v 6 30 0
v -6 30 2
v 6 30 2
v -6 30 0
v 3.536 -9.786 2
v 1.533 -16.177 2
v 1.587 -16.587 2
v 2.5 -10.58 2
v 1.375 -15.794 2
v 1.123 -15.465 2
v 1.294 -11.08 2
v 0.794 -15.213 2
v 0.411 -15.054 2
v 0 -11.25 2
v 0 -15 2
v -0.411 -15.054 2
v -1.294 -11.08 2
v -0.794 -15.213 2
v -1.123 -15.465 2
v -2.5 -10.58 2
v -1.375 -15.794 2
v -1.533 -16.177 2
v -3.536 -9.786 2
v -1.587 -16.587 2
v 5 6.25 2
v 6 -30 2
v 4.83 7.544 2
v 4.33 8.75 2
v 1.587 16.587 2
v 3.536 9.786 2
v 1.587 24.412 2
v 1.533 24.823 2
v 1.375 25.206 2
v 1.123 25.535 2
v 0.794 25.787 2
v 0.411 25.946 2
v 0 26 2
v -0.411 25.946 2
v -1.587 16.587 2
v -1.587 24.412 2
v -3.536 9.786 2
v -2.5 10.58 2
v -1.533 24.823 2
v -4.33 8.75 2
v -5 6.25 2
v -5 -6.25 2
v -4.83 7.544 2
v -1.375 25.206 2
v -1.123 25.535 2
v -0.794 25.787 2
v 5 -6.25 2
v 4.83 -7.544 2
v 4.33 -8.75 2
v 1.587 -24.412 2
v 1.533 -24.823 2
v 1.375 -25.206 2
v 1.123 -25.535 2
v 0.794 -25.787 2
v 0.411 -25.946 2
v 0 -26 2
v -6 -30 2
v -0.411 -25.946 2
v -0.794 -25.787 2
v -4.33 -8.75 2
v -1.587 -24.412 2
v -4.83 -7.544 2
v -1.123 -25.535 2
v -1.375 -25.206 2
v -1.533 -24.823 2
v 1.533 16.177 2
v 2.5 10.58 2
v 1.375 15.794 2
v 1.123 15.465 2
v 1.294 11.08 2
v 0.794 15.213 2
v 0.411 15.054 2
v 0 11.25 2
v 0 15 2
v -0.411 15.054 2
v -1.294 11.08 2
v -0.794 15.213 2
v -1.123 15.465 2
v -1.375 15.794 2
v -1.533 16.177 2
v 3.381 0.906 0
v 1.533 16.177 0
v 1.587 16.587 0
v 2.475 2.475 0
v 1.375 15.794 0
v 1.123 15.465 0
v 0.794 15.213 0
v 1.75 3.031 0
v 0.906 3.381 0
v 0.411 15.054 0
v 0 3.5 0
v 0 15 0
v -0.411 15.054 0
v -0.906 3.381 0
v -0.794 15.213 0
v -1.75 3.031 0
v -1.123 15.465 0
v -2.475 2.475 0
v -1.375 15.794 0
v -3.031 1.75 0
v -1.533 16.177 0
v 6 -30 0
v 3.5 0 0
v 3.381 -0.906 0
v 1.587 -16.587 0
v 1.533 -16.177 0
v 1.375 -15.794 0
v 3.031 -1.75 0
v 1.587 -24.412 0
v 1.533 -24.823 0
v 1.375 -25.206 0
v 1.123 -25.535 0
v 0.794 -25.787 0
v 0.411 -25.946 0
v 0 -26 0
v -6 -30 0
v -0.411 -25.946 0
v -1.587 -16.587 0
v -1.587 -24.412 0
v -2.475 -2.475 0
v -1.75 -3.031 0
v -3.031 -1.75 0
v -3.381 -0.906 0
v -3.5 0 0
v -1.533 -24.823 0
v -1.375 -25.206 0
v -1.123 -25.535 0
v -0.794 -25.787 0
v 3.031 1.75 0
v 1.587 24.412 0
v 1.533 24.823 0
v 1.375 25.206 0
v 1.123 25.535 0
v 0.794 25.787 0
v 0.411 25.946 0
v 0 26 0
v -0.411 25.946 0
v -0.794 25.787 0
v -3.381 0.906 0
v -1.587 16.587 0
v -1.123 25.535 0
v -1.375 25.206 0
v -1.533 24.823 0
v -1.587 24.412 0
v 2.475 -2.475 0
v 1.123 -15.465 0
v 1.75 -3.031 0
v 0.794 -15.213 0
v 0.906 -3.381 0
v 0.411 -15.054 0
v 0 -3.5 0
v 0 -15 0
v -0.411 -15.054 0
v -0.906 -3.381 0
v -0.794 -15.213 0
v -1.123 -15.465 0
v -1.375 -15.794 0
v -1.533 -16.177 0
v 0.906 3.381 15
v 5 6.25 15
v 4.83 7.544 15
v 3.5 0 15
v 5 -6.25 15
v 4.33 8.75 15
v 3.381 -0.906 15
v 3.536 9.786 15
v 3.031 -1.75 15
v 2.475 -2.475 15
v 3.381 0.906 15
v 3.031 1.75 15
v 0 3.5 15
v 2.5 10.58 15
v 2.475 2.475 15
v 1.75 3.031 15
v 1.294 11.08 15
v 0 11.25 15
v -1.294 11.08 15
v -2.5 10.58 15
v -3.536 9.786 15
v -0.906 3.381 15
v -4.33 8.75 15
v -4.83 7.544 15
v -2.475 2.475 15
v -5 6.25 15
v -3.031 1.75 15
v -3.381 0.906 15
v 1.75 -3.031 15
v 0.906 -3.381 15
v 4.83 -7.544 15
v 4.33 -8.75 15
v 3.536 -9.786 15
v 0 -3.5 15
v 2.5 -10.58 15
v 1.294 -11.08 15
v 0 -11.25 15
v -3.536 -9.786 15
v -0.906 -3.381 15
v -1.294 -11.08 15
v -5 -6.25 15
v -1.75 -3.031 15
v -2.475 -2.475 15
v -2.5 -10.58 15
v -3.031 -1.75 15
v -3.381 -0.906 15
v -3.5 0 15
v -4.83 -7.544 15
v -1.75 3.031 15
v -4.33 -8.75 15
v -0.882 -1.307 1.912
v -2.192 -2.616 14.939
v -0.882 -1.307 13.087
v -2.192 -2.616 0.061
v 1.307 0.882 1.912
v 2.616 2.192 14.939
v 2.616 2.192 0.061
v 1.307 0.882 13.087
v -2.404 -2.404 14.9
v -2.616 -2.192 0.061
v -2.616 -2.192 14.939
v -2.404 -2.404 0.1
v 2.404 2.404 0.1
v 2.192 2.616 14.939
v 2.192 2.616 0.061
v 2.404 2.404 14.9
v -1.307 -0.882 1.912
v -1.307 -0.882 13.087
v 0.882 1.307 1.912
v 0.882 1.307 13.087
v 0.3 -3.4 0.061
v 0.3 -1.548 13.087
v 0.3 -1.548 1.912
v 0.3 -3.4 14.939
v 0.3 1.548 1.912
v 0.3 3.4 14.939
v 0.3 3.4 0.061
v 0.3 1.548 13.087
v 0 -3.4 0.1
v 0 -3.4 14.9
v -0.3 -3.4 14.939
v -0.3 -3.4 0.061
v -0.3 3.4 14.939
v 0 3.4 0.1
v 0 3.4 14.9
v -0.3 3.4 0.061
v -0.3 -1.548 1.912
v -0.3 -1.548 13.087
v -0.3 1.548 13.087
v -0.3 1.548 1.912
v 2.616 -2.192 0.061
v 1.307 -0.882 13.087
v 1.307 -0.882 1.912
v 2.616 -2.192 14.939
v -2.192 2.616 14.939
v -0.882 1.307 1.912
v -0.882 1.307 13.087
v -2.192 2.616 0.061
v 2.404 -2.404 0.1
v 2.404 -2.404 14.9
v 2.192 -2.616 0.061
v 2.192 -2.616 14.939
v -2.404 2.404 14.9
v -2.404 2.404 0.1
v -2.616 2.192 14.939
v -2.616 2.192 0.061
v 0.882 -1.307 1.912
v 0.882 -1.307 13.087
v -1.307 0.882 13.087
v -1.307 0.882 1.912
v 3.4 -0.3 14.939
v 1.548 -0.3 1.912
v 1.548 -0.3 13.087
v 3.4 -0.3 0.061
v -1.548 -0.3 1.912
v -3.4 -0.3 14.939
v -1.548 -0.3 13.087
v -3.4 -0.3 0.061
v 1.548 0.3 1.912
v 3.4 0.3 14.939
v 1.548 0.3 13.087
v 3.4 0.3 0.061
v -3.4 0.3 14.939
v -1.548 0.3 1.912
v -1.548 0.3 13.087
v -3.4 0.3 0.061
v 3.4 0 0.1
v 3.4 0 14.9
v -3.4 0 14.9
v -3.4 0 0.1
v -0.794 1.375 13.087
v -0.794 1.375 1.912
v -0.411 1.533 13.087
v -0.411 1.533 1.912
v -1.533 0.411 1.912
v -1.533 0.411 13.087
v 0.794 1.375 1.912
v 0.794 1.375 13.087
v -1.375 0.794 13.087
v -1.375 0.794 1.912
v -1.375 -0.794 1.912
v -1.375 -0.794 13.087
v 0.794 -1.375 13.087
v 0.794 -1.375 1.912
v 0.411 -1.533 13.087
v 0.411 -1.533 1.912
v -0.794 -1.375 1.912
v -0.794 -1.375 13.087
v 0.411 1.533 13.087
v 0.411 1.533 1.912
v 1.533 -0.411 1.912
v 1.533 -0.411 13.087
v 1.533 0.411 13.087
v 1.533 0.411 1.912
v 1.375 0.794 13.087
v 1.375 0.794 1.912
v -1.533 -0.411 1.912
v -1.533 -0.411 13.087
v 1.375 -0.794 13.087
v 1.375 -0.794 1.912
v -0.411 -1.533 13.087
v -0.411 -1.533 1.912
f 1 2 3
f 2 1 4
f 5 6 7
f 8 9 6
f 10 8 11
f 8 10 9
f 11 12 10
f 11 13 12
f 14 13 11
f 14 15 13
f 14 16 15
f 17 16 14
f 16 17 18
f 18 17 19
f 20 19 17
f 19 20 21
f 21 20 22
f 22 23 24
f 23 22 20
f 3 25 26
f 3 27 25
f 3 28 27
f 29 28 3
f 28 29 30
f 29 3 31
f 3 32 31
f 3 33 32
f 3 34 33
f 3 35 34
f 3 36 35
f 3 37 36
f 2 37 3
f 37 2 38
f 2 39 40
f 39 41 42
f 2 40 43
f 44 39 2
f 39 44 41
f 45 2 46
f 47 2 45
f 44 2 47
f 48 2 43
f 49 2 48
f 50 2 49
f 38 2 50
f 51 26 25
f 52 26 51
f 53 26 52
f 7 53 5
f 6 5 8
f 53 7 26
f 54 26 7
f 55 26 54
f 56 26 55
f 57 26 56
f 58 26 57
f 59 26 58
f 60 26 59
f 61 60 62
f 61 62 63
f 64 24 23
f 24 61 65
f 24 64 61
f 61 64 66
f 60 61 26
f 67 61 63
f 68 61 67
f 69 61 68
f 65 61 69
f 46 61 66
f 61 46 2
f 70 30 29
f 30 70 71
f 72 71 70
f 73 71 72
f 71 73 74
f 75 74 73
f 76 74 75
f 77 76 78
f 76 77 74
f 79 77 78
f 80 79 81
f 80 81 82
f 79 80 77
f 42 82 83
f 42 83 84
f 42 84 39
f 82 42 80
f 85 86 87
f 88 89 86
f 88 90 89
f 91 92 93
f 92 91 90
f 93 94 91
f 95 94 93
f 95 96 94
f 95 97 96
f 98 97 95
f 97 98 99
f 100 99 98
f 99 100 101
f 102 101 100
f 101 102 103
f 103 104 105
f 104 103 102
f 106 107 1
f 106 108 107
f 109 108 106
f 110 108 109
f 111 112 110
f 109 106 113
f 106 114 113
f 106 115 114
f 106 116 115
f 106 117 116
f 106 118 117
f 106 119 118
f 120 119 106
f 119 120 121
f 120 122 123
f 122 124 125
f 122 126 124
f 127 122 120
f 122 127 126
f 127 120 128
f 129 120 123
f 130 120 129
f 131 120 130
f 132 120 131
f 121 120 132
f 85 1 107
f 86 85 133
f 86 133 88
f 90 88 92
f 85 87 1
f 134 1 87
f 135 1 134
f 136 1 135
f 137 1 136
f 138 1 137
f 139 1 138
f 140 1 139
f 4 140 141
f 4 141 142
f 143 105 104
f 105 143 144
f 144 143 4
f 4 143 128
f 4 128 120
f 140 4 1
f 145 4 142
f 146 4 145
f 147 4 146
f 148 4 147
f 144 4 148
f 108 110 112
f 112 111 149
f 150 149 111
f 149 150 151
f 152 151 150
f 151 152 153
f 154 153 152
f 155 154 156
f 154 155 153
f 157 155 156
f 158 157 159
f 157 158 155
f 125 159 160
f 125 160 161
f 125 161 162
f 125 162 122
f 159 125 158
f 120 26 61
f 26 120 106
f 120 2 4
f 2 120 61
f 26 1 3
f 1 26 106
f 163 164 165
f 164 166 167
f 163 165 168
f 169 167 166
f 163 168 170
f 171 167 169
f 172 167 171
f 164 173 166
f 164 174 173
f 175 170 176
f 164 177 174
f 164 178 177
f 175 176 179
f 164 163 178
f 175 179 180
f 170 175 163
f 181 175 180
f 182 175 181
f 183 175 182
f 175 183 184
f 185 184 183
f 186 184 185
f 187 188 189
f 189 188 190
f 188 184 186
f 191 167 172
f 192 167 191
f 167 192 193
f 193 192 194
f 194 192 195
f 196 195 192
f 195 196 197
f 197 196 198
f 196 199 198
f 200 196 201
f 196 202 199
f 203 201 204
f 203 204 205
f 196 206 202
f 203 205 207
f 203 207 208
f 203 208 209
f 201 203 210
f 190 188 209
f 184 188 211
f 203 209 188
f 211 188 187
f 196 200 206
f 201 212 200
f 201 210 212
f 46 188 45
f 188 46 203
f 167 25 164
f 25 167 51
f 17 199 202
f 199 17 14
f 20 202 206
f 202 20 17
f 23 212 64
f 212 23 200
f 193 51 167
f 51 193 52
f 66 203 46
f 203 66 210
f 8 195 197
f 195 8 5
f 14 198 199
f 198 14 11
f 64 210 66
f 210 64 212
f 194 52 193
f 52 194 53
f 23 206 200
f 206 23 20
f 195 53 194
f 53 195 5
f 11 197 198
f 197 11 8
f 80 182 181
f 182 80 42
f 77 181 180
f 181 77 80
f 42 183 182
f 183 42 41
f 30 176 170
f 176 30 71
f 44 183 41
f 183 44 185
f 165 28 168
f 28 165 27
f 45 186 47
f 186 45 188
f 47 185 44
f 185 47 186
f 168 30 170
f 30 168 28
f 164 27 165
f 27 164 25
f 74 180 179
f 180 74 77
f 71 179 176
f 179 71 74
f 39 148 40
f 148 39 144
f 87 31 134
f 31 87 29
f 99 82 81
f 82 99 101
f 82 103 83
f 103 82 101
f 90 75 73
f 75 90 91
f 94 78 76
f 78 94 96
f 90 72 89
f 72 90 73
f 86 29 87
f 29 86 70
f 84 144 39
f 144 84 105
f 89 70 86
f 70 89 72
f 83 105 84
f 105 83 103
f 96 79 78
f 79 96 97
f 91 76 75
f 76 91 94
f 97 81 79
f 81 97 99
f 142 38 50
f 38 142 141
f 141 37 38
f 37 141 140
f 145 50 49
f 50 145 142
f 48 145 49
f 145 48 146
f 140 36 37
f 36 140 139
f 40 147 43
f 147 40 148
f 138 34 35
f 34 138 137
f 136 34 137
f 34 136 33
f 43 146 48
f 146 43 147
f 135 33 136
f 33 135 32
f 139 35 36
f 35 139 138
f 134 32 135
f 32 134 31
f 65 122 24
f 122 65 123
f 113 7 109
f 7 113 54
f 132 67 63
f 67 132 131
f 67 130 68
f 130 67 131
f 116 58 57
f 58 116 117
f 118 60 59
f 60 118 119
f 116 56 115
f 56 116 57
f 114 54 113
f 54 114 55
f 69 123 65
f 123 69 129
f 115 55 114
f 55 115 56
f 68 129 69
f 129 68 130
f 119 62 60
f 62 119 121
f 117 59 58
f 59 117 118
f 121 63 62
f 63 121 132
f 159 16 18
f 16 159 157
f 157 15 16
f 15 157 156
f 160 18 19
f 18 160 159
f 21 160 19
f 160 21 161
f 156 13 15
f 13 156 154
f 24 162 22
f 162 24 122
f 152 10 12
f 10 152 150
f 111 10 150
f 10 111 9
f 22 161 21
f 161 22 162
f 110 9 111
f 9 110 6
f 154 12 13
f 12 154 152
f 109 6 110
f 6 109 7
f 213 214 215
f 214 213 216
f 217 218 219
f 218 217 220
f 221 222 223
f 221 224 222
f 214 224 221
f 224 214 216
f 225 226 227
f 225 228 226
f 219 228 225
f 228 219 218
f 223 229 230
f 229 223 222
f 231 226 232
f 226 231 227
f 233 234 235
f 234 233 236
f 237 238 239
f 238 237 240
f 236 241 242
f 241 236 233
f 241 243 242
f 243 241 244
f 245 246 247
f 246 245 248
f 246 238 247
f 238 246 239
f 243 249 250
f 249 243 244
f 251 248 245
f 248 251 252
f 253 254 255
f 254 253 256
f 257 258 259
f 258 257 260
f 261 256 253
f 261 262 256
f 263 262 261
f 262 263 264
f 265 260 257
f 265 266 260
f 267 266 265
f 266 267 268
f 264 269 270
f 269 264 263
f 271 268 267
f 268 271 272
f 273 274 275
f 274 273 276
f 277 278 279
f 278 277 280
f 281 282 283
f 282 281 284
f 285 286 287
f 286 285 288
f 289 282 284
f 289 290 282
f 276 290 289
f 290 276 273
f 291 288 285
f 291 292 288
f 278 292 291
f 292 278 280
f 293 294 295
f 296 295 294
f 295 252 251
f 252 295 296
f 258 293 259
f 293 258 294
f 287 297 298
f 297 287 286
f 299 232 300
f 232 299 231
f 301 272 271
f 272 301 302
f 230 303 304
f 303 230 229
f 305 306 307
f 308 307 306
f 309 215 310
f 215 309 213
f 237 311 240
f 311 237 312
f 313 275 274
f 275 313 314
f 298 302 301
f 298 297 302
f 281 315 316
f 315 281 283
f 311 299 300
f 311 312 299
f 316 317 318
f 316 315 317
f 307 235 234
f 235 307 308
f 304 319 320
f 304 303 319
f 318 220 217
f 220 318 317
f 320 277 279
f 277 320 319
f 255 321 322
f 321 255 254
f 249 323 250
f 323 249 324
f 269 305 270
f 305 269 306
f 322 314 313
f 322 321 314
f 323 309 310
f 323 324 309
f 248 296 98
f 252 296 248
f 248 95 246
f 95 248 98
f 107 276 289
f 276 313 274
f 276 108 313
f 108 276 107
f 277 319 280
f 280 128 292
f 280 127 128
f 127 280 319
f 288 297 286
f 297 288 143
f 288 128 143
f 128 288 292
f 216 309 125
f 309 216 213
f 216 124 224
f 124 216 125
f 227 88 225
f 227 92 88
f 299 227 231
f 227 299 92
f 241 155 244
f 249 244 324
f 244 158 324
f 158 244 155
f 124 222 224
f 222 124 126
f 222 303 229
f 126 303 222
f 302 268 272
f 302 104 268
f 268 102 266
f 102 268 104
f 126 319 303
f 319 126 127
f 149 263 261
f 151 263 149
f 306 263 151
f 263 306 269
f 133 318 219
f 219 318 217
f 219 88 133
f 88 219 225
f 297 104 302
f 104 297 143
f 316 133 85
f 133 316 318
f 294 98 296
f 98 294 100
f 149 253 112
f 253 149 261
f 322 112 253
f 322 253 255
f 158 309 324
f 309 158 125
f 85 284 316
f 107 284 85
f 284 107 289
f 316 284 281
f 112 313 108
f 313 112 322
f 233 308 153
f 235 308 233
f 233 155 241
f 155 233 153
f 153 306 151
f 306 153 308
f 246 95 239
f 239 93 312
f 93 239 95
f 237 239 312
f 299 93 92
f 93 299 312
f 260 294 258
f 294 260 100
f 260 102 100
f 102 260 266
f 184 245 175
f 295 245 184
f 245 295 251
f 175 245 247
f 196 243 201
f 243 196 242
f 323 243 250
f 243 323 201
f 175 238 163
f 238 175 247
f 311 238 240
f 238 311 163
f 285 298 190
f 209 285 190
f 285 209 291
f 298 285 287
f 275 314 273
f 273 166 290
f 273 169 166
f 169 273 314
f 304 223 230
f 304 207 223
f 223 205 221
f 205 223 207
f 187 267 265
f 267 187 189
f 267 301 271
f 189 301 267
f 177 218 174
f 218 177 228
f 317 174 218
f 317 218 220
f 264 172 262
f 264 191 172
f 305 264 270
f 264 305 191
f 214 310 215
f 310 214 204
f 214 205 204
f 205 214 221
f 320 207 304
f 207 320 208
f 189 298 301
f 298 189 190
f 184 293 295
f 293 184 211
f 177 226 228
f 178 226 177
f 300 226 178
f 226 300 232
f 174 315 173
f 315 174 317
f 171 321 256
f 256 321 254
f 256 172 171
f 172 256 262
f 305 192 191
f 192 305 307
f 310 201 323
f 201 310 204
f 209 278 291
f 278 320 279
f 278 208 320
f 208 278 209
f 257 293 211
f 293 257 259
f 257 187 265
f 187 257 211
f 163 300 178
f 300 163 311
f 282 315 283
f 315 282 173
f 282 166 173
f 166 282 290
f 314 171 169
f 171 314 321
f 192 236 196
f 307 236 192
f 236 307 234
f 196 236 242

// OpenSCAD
// Faceplate Clip - Socket and Peg

$fs=0.1;
$fa=15;

 render_part=1; // Faceplate_Clip_Peg()
//render_part=2; // Faceplate_Clip_Socket()
//render_part=3; // Faceplate_Clip_Peg and Faceplate_Clip_Socket

module Faceplate_Clip_Peg_Body(extension=0.1
	, base_width=12.0
	, base_length=60.0
	, base_height=2.0
	, peg_outer_length=22.5
	, peg_width=10.0
	, peg_height=13.0
  ) {
  union() {
    translate([-base_length/2,-base_width/2,0]) cube(size=[base_length,base_width,base_height],center=false);
    translate([-peg_outer_length/2+peg_width/2,-peg_width/2,0])
	cube(size=[peg_outer_length-peg_width,peg_width,peg_height+base_height],center=false);
    translate([-peg_outer_length/2+peg_width/2,0,0])
	cylinder(r=peg_width/2,h=peg_height+base_height,center=false);
    translate([peg_outer_length/2-peg_width/2,0,0])
	cylinder(r=peg_width/2,h=peg_height+base_height,center=false);
  }
}

module Faceplate_Clip_Peg_Holes(extension=0.1
	, base_height=2.0
	, peg_height=13.0
	, base_slot_separation=30.0
	, base_slot_width=25.4/8
	, base_slot_length=11.0
    , peg_hole_d=25.4/8
    , peg_hole_thread_d=3.6
    , peg_screw_head=6.8
    , peg_fin_w=0.6
	) {
  union() {
    translate([base_slot_separation/2+base_slot_width/2,-base_slot_width/2,-extension])
      cube(size=[base_slot_length-base_slot_width,base_slot_width,2*extension+base_height],center=false);
    translate([base_slot_separation/2+base_slot_width/2,0,-extension])
      cylinder(r=base_slot_width/2,h=2*extension+base_height,center=false);
    translate([base_slot_separation/2+base_slot_length-base_slot_width/2,0,-extension])
      cylinder(r=base_slot_width/2,h=2*extension+base_height,center=false);
  }
  union() {
    translate([-base_slot_separation/2-base_slot_length+base_slot_width/2,-base_slot_width/2,-extension])
      cube(size=[base_slot_length-base_slot_width,base_slot_width,2*extension+base_height],center=false);
    translate([-base_slot_separation/2-base_slot_length+base_slot_width/2,0,-extension])
      cylinder(r=base_slot_width/2,h=2*extension+base_height,center=false);
    translate([-base_slot_separation/2-base_slot_width/2,0,-extension])
      cylinder(r=base_slot_width/2,h=2*extension+base_height,center=false);
  }
  translate([0,0,-extension]) {
      cylinder(r=peg_hole_d/2,h=2*extension+base_height+peg_height,center=false);
      translate([0,0,extension+peg_screw_head/4]) cylinder(r2=0,r1=peg_screw_head/2+2*extension,h=peg_screw_head/2+2*extension,center=true);
      translate([0,0,(base_height+peg_height+extension)/2]) for(i=[0:3]) rotate([0,0,45*i+45]){
          cube([peg_fin_w,peg_screw_head,base_height+peg_height+2*extension],center=true);
      }
      translate([0,0,base_height+peg_height-peg_screw_head/4+extension]) cylinder(r1=0,r2=peg_screw_head/2+2*extension,h=peg_screw_head/2+2*extension,center=true);
  }
}

module Faceplate_Clip_Peg() {
  difference() {
    Faceplate_Clip_Peg_Body();
    Faceplate_Clip_Peg_Holes();
  }
}

if(render_part==1) {
  echo("Rendering Faceplate_Clip_Peg()...");
  rotate([0,0,90]) Faceplate_Clip_Peg();
}

module Faceplate_Clip_Socket_Body(extension=0.1
	, base_width=12.0
	, base_length=60.0
	, base_height=2.0
	, peg_outer_length=22.5
	, peg_width=10.0
	, peg_height=13.0
	, clip_th=3.0
  ) {
  translate([-base_length/2,-base_width/2,0]) union() {
    cube(size=[base_length,base_width+peg_width/2,base_height],center=false);
    translate([base_length/2-peg_outer_length/2-clip_th,0,0]) {
	cube(size=[clip_th,1.5*peg_width,base_height+peg_width+clip_th],center=false);
	translate([clip_th,0,peg_width+clip_th+base_height]) rotate([-90,0,0]) cylinder(r=clip_th,h=1.5*peg_width,center=false);
    }
    translate([base_length/2+peg_outer_length/2,0,0]) {
	cube(size=[clip_th,1.5*peg_width,base_height+peg_width+clip_th],center=false);
	translate([0,0,peg_width+clip_th+base_height]) rotate([-90,0,0]) cylinder(r=clip_th,h=1.5*peg_width,center=false);
    }
  }
}

module Faceplate_Clip_Socket_Holes(extension=0.1
	, base_width=12.0
	, base_length=60.0
	, base_height=2.0
	, peg_width=10.0
	, peg_height=13.0
	, base_slot_separation=30.0
	, base_slot_width=25.4/8
	, base_slot_length=11.0
	, base_slot_y_offset=10.0/5
	) {
  translate([0,peg_width/2,0]) union() {
    translate([base_slot_separation/2+base_slot_width/2,-base_slot_width/2,-extension])
      cube(size=[base_slot_length-base_slot_width,base_slot_width,2*extension+base_height],center=false);
    translate([base_slot_separation/2+base_slot_width/2,0,-extension])
      cylinder(r=base_slot_width/2,h=2*extension+base_height,center=false);
    translate([base_slot_separation/2+base_slot_length-base_slot_width/2,0,-extension])
      cylinder(r=base_slot_width/2,h=2*extension+base_height,center=false);
  }
  translate([0,peg_width/2,0]) union() {
    translate([-base_slot_separation/2-base_slot_length+base_slot_width/2,-base_slot_width/2,-extension])
      cube(size=[base_slot_length-base_slot_width,base_slot_width,2*extension+base_height],center=false);
    translate([-base_slot_separation/2-base_slot_length+base_slot_width/2,0,-extension])
      cylinder(r=base_slot_width/2,h=2*extension+base_height,center=false);
    translate([-base_slot_separation/2-base_slot_width/2,0,-extension])
      cylinder(r=base_slot_width/2,h=2*extension+base_height,center=false);
  }
  translate([0,0,-extension]) cylinder(r=base_slot_width/2,h=2*extension+base_height+peg_height,center=false);
}

module Faceplate_Clip_Socket(extension=0.1
	, base_width=12.0
  ) {
  translate([0,base_width/2,0]) difference() {
    Faceplate_Clip_Socket_Body();
    Faceplate_Clip_Socket_Holes();
  }
}

if(render_part==2) {
  echo("Rendering Faceplate_Clip_Socket()...");
  Faceplate_Clip_Socket();
}

if(render_part==3) {
  echo("Rendering Faceplate_Clip_Peg() and Faceplate_Clip_Socket()...");
  rotate([90,0,180]) Faceplate_Clip_Socket();
  translate([0,-10.0,0]) Faceplate_Clip_Peg();
}
